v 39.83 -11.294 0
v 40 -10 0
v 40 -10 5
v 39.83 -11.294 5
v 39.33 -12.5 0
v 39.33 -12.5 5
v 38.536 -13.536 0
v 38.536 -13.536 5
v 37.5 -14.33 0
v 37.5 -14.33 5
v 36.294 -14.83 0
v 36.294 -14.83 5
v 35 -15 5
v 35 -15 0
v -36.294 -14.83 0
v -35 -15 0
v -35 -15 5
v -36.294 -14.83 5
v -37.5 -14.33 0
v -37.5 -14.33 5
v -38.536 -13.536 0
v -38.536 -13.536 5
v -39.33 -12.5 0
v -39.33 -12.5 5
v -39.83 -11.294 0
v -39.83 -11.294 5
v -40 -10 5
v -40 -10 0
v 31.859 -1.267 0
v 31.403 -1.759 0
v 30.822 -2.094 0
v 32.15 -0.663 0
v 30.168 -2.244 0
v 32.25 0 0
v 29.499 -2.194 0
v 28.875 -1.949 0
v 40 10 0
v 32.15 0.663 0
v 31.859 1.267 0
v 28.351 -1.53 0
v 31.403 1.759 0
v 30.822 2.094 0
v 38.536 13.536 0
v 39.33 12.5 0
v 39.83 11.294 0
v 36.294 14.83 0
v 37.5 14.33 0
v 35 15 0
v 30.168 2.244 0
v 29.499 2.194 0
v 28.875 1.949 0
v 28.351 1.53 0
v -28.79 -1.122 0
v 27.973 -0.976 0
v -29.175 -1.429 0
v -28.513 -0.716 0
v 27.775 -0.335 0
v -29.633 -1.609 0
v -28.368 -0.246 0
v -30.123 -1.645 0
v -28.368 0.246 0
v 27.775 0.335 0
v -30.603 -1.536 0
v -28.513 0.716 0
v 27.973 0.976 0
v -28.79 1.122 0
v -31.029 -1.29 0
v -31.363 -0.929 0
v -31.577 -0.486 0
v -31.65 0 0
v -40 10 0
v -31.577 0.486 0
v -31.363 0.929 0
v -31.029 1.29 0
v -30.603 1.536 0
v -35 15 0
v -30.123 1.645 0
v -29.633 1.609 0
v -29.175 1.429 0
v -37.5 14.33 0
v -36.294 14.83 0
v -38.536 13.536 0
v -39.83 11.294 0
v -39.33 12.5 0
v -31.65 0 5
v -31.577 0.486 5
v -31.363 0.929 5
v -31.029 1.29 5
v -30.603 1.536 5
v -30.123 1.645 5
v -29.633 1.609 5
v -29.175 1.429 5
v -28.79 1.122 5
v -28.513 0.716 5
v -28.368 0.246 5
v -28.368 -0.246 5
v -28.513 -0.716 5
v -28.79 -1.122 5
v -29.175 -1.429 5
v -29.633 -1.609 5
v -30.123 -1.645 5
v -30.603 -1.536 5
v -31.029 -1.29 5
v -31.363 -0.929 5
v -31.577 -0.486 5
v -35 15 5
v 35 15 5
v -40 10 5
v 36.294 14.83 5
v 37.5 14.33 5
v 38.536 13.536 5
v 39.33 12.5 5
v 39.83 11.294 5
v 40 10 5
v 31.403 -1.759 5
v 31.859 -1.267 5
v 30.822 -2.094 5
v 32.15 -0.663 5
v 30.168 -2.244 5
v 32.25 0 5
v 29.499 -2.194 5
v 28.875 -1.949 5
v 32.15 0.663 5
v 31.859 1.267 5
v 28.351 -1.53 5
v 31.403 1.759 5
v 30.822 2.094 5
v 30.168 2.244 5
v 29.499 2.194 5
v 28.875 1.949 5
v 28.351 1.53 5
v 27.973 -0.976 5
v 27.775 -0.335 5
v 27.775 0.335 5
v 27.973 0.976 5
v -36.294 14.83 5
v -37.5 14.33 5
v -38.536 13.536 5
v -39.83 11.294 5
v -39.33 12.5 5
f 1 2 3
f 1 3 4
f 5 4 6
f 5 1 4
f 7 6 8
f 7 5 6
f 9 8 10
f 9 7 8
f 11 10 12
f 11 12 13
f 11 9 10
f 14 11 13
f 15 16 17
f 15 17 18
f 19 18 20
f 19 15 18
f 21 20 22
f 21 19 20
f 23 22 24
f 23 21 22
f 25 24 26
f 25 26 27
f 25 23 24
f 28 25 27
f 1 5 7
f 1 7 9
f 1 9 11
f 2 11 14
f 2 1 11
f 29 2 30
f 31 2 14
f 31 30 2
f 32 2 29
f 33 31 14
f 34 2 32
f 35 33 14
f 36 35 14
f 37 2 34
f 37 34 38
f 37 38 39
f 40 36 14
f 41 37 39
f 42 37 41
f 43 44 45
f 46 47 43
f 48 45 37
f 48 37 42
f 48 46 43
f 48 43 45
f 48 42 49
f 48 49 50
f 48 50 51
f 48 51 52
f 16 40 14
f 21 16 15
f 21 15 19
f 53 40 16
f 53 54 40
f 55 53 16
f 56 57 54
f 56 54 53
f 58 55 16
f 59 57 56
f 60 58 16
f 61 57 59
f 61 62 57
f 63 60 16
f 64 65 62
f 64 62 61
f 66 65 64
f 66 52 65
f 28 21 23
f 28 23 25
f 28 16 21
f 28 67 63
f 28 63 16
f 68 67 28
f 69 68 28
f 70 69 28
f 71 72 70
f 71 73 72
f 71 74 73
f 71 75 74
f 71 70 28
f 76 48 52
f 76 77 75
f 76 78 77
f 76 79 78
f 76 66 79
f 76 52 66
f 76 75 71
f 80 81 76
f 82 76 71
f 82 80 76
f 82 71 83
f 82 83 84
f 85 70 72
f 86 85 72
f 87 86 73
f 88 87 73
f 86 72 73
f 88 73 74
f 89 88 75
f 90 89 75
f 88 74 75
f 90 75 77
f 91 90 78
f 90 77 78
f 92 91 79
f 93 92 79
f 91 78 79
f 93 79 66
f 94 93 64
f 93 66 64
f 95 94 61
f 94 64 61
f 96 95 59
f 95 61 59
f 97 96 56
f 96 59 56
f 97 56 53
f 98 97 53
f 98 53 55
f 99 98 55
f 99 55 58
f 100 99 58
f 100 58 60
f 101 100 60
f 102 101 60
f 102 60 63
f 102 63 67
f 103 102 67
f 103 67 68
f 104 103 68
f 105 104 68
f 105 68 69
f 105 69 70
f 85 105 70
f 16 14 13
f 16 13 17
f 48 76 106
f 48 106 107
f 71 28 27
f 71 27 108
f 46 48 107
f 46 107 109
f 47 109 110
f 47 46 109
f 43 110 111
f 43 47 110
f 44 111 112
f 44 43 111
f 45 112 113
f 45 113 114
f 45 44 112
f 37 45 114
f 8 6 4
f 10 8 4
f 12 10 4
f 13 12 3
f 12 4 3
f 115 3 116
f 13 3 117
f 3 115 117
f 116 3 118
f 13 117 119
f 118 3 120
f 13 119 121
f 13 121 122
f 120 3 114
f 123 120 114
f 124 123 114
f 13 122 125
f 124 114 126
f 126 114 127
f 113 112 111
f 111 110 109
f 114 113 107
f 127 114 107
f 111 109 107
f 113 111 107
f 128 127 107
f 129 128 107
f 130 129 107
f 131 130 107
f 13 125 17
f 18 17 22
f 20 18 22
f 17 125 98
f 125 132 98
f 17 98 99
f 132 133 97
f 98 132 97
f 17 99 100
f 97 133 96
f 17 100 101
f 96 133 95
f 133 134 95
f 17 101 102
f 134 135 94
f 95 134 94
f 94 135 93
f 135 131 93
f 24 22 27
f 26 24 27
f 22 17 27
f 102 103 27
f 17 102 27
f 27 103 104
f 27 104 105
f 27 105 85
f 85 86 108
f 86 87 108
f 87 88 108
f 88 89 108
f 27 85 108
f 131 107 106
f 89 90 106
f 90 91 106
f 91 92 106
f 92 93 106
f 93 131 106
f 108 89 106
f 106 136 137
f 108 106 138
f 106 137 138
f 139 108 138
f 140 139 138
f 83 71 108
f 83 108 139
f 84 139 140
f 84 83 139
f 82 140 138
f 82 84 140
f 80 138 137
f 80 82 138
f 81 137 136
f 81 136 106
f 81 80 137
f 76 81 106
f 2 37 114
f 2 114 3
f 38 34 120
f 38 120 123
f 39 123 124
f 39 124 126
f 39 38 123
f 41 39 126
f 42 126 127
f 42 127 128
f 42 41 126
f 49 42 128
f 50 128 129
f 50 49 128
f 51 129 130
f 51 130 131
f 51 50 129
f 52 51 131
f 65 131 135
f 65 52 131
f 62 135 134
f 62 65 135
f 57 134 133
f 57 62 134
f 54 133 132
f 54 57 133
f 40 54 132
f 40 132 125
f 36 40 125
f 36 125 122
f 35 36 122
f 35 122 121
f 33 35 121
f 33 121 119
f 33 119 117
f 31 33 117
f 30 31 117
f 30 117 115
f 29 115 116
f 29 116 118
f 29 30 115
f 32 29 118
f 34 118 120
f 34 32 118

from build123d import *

# Parameters (mm, degrees)
ESQUISSE1_R        = 2.25
BOSS_EXTRU_1_DEPTH = 5
TROU_TARAUD_M41_D  = 3.3


with BuildPart() as part:
    # Esquisse1 → Boss.-Extru.1 (new body)
    with BuildSketch(Plane.XY):
        with BuildLine():
            Line((-35, 15), (35, 15))
            ThreePointArc((35, 15), (38.535533906, 13.535533906), (40, 10))
            Line((40, 10), (40, -10))
            ThreePointArc((40, -10), (38.535533906, -13.535533906), (35, -15))
            Line((35, -15), (-35, -15))
            ThreePointArc((-35, -15), (-38.535533906, -13.535533906), (-40, -10))
            Line((-40, -10), (-40, 10))
            ThreePointArc((-40, 10), (-38.535533906, 13.535533906), (-35, 15))
        make_face()
        with Locations((30, 0)):
            Circle(ESQUISSE1_R, mode=Mode.SUBTRACT)
    extrude(amount=BOSS_EXTRU_1_DEPTH)

    # Trou taraudé M41 (through all)
    with Locations(Plane.XY.offset(5)):
        with Locations((-30, 0)):
            Hole(TROU_TARAUD_M41_D / 2)


solid = part.part
